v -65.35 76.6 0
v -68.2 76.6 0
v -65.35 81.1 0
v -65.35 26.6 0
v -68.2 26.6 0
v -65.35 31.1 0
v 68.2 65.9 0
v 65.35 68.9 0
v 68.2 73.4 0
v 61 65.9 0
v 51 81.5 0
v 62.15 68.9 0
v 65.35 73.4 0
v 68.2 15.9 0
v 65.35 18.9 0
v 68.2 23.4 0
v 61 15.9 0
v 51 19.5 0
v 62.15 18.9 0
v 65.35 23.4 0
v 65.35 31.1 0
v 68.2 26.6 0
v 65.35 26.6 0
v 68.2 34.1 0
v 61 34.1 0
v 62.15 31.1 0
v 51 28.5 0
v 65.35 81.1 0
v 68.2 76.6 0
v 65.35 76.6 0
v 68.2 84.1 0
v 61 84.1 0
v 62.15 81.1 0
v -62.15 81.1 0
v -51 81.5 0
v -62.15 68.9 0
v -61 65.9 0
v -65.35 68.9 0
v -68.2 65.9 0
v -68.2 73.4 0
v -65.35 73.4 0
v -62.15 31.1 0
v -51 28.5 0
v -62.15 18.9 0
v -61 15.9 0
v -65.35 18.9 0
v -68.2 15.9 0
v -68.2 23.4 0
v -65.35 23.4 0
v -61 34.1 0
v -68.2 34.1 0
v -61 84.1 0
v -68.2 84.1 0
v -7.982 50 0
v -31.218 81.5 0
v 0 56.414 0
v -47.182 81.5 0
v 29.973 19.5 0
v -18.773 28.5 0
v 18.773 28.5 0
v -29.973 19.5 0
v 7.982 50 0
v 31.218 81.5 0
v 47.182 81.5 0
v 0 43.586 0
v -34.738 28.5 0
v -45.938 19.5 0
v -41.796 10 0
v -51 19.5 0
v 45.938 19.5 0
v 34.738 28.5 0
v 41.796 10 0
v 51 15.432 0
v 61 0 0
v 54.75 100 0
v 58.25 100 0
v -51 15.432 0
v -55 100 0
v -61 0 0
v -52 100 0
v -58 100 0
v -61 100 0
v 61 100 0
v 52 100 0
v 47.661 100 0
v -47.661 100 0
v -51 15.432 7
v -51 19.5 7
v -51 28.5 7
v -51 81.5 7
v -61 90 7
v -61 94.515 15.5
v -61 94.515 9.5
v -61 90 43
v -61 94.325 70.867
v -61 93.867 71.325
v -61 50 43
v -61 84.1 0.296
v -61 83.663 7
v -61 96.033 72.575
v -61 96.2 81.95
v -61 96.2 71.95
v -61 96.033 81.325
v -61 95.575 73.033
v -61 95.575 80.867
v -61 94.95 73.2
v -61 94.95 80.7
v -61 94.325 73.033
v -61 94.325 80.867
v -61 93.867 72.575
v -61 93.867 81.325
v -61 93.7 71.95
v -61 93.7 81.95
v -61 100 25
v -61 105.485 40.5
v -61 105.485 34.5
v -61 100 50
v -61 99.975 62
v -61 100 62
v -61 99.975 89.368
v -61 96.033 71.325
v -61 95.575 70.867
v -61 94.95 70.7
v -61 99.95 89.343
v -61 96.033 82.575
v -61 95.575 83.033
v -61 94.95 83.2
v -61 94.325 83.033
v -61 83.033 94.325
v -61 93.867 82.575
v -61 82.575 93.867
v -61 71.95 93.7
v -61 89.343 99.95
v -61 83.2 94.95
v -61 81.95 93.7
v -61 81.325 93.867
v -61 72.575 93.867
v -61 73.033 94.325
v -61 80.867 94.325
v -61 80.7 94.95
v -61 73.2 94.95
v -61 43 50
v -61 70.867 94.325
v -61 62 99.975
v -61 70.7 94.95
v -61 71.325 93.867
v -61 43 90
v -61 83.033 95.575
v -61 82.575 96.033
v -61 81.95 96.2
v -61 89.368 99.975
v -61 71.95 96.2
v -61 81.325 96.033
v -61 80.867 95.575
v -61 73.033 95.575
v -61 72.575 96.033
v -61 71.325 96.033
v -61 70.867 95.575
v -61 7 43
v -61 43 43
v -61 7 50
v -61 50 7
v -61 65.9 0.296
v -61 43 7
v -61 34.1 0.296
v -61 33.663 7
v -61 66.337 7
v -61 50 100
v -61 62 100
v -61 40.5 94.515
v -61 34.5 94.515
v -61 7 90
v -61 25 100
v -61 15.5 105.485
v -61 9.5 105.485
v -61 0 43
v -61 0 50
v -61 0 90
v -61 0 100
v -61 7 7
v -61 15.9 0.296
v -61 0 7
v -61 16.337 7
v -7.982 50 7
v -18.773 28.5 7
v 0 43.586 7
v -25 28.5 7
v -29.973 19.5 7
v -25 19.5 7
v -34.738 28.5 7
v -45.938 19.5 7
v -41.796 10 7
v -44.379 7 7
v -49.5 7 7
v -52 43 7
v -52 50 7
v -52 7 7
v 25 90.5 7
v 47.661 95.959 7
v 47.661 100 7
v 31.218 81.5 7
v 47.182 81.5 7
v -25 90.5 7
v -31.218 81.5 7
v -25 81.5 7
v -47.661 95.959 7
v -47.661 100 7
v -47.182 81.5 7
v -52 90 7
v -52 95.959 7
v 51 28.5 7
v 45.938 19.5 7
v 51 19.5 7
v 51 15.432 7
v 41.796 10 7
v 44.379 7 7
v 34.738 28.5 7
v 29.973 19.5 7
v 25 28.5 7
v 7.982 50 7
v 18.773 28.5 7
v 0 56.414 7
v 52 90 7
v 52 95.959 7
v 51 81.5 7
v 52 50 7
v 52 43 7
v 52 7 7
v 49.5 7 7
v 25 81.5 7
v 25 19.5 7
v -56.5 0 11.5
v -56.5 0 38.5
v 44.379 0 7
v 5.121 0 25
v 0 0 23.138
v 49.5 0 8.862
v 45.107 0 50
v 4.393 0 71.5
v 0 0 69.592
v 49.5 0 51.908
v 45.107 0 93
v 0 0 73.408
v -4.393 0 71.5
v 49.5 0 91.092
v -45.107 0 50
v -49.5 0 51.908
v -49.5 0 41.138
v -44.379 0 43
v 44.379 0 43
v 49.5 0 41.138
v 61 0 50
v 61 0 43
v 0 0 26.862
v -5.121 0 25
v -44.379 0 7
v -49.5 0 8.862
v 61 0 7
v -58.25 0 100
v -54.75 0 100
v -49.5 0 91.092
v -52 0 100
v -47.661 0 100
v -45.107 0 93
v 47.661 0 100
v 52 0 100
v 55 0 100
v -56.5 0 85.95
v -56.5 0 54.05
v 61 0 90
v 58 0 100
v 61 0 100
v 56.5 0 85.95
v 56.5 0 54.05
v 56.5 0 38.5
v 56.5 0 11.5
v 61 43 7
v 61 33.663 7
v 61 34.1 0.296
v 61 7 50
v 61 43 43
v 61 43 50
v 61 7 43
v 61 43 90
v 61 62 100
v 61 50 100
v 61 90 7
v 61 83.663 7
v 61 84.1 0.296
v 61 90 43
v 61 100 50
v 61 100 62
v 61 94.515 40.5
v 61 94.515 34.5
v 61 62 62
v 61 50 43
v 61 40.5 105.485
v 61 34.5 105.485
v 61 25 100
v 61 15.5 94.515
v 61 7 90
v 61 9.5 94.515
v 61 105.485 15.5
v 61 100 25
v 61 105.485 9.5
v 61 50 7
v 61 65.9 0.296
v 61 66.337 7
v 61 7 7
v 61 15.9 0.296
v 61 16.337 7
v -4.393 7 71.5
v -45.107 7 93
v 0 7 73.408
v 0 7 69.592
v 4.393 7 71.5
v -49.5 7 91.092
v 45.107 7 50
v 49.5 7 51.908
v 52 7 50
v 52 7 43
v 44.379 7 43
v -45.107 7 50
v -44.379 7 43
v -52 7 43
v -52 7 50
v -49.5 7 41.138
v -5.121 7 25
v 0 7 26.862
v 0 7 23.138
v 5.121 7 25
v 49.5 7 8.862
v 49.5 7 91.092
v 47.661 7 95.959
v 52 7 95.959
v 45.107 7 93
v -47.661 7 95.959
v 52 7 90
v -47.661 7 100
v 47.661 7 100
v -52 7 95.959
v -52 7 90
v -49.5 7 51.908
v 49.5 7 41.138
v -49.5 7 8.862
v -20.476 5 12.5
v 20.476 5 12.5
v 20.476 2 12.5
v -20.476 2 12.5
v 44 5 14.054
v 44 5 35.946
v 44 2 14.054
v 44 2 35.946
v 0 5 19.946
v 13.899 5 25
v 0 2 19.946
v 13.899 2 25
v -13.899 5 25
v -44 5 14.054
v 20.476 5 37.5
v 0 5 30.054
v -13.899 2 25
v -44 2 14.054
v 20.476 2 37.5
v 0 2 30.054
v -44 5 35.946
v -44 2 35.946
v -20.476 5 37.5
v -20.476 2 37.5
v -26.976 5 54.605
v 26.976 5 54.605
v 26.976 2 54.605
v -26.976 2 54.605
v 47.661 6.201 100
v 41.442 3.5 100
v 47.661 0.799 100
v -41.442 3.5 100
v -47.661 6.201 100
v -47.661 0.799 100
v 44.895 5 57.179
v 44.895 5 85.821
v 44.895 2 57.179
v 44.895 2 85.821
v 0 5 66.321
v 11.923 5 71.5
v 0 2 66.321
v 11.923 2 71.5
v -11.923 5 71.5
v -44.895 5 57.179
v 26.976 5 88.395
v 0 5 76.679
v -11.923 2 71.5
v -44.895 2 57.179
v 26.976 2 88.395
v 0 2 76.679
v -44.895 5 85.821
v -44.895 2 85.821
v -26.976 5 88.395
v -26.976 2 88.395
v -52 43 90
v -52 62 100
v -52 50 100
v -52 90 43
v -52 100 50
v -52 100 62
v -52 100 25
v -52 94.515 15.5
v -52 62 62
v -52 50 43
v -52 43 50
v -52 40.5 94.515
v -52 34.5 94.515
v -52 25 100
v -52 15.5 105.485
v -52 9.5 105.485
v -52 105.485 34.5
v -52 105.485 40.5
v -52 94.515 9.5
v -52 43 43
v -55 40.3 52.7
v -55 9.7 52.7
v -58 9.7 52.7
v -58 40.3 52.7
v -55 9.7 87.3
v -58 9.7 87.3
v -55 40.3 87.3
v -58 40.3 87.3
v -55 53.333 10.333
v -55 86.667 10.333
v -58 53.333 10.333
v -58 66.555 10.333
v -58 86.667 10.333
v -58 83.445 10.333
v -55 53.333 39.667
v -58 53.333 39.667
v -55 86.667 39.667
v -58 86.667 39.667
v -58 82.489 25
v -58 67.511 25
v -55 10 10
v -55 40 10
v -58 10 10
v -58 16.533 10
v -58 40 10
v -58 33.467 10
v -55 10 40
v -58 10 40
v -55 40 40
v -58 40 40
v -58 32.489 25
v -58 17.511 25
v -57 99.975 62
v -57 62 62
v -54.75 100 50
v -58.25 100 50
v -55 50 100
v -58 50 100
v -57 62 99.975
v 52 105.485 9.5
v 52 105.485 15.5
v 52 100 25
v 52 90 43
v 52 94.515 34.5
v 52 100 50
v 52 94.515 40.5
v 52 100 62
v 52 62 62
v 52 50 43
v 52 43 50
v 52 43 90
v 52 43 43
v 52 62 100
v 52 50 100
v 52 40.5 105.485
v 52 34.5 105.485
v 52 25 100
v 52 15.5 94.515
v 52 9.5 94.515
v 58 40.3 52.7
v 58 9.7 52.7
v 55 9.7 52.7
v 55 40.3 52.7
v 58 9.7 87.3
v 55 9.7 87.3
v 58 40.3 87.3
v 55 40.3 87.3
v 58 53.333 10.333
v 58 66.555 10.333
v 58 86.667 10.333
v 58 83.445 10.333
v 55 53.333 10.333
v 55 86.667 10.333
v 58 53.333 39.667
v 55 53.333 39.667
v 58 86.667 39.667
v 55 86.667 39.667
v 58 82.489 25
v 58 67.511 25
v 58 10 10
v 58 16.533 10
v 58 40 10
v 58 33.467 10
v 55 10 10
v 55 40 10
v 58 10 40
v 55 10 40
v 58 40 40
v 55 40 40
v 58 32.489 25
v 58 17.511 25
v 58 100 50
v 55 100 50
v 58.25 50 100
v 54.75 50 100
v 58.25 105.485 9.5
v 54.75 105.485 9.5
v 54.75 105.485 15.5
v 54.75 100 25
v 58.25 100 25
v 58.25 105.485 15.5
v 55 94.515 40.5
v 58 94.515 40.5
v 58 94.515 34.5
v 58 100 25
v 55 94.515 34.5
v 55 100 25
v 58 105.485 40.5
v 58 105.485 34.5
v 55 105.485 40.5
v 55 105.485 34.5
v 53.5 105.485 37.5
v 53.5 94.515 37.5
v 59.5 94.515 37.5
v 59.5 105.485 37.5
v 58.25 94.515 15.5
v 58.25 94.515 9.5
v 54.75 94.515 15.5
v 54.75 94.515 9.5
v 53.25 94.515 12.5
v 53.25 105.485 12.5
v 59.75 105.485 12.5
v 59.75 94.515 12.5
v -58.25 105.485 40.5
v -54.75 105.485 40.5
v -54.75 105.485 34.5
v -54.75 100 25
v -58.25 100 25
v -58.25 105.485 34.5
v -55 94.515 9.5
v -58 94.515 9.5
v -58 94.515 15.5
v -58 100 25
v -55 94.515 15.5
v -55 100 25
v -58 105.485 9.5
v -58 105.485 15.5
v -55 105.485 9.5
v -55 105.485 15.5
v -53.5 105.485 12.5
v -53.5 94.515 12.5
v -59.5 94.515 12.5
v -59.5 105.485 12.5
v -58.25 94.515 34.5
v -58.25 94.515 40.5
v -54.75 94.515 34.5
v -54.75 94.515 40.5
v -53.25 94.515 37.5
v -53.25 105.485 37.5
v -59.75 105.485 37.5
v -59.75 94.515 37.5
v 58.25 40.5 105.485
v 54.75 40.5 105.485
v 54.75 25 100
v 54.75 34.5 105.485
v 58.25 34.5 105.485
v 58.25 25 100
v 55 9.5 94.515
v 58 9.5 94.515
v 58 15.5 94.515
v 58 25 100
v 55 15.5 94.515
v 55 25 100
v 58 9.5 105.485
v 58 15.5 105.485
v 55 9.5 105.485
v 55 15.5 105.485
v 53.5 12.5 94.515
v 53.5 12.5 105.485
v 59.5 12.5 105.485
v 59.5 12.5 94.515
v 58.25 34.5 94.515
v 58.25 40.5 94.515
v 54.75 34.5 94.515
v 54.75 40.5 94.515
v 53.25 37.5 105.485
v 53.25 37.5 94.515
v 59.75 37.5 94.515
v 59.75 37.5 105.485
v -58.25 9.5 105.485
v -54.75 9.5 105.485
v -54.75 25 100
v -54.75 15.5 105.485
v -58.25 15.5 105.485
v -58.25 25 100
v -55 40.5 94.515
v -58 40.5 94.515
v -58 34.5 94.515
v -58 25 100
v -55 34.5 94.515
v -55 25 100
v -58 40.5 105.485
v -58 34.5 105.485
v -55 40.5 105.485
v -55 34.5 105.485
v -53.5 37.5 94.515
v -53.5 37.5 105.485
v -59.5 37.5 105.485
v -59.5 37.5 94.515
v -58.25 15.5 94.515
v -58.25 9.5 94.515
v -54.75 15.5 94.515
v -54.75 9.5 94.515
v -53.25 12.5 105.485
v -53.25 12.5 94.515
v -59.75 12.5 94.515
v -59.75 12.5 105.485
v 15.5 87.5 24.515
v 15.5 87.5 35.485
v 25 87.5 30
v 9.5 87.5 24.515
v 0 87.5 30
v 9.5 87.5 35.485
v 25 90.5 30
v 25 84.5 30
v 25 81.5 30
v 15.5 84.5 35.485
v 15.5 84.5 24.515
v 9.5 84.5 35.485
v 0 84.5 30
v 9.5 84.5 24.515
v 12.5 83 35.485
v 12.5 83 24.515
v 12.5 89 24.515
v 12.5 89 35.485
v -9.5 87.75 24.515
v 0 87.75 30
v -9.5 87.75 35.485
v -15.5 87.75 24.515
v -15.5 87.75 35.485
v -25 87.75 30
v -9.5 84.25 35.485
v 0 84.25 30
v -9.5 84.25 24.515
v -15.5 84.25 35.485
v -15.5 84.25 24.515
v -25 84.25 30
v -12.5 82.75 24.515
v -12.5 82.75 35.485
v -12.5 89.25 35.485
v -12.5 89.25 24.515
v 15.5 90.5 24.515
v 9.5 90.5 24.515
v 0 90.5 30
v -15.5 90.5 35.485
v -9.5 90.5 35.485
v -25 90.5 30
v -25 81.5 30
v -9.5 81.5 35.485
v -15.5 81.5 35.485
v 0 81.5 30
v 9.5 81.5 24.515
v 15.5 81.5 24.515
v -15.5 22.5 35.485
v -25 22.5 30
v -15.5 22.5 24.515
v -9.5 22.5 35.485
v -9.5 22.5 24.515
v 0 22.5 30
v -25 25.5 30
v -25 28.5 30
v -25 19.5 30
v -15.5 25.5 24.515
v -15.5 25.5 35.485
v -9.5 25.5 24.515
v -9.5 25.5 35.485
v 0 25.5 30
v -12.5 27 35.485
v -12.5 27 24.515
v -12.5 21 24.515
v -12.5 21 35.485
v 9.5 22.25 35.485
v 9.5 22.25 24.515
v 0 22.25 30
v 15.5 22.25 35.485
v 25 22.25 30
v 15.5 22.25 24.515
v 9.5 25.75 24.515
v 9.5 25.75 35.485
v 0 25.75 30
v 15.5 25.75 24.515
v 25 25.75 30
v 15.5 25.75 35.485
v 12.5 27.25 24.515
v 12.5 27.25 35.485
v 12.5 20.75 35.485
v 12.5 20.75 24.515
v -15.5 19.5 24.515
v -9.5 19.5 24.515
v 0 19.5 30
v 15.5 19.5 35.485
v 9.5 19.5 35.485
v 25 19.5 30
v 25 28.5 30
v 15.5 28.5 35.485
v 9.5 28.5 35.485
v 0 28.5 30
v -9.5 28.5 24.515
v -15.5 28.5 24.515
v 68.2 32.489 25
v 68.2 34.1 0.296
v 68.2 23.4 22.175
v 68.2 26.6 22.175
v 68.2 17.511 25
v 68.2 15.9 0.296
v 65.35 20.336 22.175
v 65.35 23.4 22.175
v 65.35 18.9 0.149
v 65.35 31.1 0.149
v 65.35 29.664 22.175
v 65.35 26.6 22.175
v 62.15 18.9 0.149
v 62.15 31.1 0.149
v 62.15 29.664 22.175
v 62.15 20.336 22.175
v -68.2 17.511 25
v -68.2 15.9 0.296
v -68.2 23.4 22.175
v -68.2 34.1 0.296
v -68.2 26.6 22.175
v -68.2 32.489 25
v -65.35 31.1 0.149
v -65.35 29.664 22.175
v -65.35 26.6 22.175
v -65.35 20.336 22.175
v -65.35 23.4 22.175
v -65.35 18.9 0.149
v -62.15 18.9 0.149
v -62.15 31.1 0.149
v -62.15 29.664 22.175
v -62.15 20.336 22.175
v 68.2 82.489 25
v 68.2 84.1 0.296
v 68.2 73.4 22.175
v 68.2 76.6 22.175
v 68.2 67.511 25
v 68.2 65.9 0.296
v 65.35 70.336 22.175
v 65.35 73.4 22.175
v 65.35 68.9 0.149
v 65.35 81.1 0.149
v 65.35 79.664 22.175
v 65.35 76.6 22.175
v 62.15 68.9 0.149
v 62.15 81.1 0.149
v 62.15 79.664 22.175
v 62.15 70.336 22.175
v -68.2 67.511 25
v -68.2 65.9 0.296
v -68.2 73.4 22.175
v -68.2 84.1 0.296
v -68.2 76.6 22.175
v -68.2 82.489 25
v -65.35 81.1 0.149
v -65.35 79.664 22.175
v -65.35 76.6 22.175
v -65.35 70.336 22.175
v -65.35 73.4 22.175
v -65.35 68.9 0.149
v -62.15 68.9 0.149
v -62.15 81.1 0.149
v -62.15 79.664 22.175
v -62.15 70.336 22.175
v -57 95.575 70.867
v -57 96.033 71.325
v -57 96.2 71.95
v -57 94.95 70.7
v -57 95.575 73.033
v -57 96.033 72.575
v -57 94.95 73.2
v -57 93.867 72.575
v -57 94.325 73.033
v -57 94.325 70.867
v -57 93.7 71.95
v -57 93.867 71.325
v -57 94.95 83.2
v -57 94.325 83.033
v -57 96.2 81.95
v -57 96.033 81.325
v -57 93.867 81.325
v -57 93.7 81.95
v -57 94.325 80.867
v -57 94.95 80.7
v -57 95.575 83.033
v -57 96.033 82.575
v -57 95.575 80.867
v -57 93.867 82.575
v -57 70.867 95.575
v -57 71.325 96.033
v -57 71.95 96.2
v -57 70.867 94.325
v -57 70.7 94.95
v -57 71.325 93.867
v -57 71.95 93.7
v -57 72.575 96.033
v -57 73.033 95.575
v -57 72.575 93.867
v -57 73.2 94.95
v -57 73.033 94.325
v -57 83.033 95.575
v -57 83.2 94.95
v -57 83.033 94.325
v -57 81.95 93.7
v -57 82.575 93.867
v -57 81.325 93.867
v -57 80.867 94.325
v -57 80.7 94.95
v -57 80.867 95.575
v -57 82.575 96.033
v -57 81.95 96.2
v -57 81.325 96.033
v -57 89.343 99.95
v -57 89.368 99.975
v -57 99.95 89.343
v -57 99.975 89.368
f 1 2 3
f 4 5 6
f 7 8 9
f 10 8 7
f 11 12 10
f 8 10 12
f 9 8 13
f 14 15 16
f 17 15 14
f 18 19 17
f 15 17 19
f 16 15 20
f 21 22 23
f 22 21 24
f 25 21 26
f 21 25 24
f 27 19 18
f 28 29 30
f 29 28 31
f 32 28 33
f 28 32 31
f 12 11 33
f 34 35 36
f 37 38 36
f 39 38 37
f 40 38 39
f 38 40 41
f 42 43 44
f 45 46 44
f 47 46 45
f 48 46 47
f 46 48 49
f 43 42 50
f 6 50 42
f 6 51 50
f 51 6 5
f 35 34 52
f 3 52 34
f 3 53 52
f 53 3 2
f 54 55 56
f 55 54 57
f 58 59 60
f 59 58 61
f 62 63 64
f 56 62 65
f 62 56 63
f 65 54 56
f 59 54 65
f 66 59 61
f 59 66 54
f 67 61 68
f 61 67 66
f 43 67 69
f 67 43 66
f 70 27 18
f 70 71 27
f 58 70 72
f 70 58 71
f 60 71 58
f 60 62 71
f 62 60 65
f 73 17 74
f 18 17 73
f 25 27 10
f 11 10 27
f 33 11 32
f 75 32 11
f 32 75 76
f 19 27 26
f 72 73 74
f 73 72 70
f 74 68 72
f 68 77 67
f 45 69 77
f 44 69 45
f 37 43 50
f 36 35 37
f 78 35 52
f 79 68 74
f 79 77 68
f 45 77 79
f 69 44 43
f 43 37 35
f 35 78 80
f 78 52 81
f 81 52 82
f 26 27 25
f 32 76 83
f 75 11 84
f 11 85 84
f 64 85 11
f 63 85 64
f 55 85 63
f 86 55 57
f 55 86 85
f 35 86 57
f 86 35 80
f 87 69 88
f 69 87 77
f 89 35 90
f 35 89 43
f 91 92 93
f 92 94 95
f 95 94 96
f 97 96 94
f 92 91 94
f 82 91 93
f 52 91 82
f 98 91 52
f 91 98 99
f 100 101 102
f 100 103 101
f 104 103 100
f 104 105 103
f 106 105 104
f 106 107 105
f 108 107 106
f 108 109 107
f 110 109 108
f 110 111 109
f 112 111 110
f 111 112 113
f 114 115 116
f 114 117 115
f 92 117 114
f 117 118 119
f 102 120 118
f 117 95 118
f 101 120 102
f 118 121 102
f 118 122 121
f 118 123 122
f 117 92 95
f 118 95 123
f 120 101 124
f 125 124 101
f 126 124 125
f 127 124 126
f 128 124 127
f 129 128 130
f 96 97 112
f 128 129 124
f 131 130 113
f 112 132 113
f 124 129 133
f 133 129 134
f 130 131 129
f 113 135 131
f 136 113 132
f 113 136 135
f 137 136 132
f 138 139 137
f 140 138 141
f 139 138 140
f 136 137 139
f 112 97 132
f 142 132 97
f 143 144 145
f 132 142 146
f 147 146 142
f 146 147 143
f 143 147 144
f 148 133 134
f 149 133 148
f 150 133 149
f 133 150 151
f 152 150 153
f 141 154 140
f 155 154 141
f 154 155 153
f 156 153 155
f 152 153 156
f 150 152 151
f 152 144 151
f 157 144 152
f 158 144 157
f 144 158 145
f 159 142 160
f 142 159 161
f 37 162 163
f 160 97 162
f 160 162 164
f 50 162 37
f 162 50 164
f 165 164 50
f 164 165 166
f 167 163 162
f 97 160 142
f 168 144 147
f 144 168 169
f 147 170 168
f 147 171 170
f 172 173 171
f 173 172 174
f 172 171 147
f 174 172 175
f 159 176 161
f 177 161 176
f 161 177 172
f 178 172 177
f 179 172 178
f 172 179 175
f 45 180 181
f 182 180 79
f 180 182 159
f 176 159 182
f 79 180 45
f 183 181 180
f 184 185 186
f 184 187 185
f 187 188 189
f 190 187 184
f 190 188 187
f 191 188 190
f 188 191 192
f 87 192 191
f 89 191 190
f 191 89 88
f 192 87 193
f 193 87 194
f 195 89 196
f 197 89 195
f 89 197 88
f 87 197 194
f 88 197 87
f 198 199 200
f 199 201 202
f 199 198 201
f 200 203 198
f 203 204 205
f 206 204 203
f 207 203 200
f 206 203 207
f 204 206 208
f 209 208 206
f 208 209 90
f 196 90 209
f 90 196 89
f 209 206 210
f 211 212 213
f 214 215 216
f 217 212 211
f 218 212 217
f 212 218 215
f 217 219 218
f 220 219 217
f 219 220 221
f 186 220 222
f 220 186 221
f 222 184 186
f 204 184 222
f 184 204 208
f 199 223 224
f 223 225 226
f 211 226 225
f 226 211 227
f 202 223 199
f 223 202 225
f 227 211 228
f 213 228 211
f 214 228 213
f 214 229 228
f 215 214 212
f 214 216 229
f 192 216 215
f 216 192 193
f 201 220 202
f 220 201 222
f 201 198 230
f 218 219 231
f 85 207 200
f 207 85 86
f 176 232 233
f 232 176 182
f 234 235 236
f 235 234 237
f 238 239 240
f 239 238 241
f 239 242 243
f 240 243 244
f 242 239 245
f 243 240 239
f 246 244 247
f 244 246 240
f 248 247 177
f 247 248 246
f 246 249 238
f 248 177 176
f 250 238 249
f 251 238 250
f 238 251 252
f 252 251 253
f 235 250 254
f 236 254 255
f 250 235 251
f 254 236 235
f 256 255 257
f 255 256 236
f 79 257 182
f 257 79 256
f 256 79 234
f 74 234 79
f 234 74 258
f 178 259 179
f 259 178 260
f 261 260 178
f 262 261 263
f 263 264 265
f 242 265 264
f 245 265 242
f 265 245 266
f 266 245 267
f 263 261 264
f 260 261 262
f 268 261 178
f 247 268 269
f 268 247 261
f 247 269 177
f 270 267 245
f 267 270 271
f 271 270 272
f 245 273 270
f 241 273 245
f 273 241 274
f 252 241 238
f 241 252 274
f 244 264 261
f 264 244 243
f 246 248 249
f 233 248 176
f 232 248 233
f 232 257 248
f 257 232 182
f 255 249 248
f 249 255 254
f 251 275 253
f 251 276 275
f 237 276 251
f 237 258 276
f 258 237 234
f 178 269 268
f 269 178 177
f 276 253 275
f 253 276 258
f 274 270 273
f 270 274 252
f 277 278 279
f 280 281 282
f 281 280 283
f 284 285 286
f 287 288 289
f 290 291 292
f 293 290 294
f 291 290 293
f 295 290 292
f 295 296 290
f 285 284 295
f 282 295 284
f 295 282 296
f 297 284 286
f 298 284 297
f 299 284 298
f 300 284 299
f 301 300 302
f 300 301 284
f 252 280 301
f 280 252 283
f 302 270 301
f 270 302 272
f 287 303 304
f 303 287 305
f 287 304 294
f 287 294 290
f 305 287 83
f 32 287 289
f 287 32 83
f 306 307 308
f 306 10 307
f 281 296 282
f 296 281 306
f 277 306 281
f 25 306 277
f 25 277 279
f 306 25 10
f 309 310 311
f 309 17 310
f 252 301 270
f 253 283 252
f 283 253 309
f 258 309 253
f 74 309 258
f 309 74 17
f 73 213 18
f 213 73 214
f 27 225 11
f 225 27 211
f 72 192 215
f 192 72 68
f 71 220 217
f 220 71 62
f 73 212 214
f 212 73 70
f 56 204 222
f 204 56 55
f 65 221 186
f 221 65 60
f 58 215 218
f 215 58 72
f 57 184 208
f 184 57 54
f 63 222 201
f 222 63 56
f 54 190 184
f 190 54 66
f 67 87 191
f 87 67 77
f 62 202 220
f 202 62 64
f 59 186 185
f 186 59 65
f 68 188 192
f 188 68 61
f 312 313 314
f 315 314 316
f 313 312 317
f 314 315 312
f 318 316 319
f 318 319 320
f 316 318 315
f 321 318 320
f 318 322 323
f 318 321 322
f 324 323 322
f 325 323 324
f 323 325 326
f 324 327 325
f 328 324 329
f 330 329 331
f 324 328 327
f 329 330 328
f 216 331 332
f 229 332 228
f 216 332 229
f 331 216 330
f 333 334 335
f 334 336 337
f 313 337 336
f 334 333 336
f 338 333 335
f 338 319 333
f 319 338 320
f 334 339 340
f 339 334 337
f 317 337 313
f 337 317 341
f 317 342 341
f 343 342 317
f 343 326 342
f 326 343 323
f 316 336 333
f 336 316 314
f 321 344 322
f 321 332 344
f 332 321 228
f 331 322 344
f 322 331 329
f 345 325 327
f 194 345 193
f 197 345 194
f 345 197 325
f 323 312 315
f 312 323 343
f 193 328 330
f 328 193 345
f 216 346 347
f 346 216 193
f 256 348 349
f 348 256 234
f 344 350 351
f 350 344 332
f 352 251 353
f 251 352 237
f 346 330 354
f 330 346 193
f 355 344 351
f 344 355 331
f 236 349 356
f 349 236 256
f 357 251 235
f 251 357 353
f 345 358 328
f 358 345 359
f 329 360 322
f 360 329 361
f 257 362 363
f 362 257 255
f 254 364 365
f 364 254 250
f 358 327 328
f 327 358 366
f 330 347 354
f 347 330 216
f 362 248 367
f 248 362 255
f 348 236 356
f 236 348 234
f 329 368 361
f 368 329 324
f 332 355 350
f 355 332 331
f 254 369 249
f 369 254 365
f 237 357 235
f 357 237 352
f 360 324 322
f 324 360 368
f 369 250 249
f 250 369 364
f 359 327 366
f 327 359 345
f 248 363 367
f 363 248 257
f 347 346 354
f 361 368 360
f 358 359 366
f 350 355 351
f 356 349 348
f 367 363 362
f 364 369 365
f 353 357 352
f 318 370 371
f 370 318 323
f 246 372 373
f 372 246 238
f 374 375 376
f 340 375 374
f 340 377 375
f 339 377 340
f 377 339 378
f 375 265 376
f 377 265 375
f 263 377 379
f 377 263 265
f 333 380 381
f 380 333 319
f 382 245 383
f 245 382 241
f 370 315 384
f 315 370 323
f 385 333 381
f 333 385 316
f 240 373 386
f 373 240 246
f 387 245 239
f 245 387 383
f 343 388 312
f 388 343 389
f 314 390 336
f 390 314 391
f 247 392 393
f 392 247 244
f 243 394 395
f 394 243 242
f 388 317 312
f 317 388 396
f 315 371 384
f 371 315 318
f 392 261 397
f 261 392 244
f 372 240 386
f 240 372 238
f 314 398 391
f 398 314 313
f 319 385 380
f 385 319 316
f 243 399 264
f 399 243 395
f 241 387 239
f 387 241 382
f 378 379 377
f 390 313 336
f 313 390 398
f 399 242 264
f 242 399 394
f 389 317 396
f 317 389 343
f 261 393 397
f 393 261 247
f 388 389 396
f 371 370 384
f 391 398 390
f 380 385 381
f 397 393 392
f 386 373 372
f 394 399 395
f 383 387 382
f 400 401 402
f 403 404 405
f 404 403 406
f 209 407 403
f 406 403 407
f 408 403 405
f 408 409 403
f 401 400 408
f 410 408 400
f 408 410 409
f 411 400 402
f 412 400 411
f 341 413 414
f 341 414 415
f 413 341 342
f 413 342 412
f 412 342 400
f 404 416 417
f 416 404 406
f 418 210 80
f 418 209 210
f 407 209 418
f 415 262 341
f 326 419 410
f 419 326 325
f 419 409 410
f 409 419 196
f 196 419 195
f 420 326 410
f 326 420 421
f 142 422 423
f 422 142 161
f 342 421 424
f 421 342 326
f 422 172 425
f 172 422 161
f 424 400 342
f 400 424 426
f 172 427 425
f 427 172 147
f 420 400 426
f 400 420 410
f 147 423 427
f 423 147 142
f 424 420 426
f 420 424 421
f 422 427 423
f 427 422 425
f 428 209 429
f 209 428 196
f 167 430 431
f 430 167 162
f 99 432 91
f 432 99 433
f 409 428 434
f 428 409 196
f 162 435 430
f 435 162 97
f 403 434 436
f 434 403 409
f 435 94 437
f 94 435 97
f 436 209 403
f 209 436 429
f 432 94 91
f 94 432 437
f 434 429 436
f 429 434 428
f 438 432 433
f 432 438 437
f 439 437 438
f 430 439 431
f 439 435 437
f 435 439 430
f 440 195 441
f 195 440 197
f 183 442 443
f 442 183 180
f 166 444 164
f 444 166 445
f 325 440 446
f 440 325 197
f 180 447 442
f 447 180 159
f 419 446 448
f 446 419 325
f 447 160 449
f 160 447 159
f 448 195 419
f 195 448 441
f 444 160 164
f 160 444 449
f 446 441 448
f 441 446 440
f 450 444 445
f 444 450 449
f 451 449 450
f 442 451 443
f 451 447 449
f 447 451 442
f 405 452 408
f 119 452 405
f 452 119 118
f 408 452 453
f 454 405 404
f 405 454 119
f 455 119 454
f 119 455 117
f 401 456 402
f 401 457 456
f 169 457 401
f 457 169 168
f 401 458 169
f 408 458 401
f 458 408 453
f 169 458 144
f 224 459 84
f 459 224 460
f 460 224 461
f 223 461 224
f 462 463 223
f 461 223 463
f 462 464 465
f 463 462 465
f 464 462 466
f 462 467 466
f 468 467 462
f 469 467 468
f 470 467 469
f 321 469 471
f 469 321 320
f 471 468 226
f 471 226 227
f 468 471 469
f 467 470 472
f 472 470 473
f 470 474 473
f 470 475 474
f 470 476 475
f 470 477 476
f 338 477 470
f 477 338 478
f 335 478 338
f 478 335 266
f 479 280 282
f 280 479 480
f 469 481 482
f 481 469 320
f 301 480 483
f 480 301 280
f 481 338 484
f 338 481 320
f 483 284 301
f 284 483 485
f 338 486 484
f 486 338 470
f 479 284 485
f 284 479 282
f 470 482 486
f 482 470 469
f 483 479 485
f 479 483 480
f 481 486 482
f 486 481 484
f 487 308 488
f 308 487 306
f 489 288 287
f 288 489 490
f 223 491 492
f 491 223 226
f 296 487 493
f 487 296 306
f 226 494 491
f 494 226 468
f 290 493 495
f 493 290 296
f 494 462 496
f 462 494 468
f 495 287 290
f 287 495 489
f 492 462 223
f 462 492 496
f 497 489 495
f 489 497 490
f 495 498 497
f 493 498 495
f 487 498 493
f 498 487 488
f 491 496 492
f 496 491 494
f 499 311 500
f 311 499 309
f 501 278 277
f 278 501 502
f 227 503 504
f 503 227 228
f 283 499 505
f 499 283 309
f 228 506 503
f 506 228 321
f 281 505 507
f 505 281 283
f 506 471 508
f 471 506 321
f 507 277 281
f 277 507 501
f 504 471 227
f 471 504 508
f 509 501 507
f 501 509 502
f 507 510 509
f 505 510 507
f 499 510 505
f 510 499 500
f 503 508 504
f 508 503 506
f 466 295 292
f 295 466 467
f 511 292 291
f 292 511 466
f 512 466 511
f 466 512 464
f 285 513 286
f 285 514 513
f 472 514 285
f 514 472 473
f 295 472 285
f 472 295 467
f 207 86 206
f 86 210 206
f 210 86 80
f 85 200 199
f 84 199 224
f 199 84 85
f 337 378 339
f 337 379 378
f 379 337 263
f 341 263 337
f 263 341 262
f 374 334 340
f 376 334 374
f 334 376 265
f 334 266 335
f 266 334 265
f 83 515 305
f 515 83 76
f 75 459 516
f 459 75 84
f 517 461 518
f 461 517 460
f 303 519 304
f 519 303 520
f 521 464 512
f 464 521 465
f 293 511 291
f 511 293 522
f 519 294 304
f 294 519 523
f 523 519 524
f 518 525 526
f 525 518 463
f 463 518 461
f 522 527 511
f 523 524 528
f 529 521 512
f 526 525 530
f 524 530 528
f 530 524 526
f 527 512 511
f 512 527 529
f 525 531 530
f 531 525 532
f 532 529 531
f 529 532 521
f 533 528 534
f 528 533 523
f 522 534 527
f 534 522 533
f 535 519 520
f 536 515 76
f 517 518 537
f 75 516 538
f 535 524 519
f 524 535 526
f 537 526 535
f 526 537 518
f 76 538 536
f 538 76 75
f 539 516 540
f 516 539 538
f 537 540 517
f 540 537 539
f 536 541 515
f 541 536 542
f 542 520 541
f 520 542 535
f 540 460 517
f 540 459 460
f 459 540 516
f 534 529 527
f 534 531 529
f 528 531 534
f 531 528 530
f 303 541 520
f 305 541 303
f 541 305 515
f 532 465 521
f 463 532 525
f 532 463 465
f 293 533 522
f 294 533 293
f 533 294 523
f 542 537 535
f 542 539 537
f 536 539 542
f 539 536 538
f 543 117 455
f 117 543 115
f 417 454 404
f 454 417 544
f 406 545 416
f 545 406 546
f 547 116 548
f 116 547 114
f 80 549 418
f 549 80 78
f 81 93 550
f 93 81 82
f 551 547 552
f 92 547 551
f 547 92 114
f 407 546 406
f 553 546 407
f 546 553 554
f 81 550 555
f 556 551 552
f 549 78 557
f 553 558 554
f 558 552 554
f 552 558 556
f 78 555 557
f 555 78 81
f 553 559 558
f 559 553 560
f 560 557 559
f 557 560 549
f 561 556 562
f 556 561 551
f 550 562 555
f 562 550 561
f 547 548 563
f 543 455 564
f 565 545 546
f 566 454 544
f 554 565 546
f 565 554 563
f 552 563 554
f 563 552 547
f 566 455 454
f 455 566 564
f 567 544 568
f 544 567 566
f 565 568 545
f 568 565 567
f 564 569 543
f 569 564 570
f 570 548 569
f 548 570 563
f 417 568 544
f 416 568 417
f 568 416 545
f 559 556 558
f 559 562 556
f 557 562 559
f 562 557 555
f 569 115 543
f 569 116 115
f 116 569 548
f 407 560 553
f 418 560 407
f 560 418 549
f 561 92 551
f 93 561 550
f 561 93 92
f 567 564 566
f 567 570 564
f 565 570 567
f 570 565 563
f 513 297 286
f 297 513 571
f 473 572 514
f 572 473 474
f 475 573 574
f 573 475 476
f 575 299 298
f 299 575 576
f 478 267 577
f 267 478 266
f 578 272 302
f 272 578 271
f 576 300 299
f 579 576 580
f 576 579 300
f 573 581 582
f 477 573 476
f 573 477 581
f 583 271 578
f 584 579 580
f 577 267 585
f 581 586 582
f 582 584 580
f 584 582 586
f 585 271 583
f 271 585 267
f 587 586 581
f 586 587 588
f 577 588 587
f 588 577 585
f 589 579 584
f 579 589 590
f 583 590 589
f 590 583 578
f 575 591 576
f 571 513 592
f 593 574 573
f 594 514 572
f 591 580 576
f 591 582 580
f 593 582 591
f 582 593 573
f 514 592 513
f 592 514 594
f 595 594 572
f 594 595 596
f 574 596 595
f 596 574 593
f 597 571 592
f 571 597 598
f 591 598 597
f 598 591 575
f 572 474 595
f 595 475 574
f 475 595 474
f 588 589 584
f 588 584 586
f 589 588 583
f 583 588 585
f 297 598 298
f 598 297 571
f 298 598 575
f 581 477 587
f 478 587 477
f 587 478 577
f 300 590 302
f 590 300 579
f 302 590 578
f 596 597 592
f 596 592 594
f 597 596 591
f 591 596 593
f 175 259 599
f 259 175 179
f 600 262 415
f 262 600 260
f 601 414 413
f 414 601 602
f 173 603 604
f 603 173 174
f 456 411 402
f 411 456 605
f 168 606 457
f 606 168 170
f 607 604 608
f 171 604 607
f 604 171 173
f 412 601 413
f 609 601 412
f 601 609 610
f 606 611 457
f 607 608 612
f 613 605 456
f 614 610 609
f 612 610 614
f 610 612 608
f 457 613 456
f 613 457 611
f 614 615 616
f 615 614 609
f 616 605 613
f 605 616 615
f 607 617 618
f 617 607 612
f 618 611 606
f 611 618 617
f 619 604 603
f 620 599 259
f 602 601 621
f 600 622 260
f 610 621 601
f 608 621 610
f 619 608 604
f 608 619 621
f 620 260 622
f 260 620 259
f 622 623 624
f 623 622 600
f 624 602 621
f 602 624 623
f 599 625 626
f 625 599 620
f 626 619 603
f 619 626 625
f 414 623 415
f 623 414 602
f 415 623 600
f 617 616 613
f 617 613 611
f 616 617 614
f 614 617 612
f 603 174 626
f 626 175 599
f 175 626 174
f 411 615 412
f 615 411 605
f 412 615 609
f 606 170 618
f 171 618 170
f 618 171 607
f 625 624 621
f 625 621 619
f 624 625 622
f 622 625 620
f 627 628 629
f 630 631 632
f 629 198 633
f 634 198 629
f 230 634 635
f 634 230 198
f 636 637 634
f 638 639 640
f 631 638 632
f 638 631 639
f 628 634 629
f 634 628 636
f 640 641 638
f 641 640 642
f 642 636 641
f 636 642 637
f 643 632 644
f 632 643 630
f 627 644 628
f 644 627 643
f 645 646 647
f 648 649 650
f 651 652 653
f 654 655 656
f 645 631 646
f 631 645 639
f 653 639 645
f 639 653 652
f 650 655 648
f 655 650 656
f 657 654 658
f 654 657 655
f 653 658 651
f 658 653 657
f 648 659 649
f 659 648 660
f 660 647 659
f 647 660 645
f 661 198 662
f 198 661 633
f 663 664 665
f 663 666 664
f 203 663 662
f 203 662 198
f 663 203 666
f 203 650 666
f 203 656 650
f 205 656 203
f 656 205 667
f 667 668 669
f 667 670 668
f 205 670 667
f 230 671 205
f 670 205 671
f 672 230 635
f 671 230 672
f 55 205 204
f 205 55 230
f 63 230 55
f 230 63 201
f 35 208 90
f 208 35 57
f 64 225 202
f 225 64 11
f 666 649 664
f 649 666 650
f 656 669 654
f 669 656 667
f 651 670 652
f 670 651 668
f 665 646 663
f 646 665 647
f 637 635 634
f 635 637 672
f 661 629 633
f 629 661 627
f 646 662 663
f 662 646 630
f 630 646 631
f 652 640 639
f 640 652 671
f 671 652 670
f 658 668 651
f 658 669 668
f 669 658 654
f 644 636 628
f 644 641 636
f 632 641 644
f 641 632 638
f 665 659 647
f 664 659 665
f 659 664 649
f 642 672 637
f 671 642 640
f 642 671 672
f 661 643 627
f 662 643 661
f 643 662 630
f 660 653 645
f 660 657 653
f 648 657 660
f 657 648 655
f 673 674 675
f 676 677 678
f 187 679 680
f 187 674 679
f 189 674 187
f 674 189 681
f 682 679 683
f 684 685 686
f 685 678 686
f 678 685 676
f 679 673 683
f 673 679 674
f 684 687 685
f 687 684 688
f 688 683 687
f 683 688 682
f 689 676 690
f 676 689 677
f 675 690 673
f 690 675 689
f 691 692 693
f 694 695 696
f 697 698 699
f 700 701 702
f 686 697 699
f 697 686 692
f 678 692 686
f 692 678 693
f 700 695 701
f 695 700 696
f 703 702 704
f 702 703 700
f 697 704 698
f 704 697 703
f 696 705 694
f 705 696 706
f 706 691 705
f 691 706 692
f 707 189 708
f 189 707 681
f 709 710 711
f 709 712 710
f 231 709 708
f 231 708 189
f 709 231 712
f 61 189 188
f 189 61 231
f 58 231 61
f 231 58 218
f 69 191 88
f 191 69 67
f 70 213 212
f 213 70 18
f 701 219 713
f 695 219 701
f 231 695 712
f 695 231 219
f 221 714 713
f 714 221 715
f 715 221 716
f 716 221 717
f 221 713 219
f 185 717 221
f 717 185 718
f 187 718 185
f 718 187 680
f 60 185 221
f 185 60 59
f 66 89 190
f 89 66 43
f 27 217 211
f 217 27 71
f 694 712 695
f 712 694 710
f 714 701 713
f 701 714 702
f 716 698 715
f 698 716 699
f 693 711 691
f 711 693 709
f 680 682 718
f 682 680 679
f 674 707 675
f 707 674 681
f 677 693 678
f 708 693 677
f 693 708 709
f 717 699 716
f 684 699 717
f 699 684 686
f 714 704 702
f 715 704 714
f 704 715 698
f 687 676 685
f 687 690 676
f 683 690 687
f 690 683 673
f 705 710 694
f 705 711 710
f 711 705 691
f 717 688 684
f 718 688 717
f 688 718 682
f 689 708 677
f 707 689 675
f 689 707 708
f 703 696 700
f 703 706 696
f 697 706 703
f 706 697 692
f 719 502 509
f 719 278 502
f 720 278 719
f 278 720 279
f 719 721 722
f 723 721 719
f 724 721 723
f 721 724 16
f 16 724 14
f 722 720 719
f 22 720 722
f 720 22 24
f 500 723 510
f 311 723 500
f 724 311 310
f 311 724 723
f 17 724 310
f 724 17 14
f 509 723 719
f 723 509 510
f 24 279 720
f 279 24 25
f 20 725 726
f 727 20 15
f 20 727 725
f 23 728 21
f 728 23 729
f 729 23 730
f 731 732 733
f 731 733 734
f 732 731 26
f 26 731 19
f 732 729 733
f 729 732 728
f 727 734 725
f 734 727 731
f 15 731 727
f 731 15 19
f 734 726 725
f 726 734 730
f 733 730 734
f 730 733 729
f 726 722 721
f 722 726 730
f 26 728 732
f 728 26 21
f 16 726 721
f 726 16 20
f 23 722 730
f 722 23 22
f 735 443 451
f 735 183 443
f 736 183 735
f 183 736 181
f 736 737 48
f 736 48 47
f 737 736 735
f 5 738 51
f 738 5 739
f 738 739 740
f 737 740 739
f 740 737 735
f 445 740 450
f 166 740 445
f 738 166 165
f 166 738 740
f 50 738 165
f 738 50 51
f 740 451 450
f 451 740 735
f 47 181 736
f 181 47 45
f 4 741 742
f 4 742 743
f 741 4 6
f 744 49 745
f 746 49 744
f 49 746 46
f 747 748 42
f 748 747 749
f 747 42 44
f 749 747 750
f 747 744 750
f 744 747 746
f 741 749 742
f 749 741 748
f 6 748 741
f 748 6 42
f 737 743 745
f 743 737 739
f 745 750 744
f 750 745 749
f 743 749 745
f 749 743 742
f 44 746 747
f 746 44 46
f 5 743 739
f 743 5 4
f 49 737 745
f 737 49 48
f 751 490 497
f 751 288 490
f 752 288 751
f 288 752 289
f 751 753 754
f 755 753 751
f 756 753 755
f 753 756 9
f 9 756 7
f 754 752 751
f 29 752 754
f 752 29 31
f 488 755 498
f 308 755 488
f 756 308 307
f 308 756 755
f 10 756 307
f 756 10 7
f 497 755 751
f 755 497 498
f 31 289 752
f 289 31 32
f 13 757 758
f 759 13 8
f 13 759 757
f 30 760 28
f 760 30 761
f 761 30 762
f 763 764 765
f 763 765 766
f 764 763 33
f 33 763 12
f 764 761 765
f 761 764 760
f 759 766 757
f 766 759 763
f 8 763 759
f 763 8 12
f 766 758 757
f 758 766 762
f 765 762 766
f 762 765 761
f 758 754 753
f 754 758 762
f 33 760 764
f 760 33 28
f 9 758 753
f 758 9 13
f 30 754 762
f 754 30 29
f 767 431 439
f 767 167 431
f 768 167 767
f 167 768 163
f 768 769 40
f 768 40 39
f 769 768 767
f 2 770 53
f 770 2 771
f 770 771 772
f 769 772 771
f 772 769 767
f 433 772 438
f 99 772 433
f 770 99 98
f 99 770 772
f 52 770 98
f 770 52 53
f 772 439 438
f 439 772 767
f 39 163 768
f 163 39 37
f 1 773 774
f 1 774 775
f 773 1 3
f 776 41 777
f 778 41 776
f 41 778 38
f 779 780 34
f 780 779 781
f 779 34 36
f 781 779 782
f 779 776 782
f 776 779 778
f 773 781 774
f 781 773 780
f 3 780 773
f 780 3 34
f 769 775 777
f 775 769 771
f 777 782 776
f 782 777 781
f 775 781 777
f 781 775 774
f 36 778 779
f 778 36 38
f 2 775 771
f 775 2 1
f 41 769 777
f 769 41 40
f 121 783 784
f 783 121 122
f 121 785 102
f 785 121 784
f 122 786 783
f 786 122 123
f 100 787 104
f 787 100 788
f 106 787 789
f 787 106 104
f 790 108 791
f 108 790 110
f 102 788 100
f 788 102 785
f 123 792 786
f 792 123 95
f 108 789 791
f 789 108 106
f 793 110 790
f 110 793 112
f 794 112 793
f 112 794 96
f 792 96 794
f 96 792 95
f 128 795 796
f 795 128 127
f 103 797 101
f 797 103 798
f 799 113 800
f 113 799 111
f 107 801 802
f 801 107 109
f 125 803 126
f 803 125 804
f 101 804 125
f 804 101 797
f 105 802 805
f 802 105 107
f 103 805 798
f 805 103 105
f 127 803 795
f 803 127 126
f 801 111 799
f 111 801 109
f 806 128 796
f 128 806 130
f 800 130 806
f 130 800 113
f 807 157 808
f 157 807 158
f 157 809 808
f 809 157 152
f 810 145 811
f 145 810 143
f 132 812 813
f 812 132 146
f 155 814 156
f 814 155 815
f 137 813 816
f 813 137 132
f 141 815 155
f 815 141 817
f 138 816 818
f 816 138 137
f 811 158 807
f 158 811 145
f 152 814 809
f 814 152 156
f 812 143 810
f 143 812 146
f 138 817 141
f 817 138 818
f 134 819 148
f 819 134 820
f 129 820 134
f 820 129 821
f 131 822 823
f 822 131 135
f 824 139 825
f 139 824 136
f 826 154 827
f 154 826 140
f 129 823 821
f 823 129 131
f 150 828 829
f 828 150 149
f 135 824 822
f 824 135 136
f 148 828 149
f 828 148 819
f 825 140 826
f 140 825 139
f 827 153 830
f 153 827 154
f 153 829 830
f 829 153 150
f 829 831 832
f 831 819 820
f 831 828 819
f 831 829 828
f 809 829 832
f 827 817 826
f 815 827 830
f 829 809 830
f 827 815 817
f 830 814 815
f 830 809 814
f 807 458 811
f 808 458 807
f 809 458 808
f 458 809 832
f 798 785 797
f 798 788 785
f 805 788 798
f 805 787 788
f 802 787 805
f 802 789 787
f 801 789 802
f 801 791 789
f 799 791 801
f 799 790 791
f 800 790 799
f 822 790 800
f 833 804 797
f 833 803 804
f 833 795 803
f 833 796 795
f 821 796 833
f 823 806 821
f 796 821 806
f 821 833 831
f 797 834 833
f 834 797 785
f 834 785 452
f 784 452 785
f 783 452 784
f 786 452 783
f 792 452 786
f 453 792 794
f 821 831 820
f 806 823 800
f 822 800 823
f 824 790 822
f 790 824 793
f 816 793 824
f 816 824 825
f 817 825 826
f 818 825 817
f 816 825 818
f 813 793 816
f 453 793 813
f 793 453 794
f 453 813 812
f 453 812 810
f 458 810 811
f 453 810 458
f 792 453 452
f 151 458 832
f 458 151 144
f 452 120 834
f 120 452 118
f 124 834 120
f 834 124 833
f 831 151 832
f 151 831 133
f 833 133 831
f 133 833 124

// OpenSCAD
// file: joiners.scad
include <config.scad>
use <GDMUtils.scad>

module joiner(h=40, w=9, l=10, a=30, screwsize=undef, guides=true)
{
	dmnd_height = h/2;
	dmnd_width = dmnd_height*tan(a);
	guide_size = w/3;

	render(convexity=4) union() {
		difference() {
			union() {
				// Make base.
				difference() {
					union() {
						translate([0,-l/2,0]) cube(size=[w, l, h], center=true);
						translate([0,0,-h/4])
							scale([w, dmnd_width/2, dmnd_height/2])
								xrot(45) cube(size=[1,sqrt(2),sqrt(2)], center=true);
					}
					translate([0,0,h/4])
						scale([w*1.1, dmnd_width/2, dmnd_height/2])
							xrot(45) cube(size=[1,sqrt(2),sqrt(2)], center=true);
				}

				// Make tab
				translate([0,0,dmnd_height/2]) {
					translate([0, -dmnd_width/4, 0])
						cube(size=[w/3, dmnd_width/2, dmnd_height], center=true);
					scale([w/3, dmnd_width/2, dmnd_height/2]) xrot(45)
						cube(size=[1,sqrt(2),sqrt(2)], center=true);
				}

				// Guide ridges.
				if (guides == true) {
					translate([0,0,dmnd_height/2]) {
						grid_of(xa=[-w/6,w/6]) {
							scale([1,1,2]) yrot(45)
								cube(size=[guide_size/sqrt(2), dmnd_width, guide_size/sqrt(2)], center=true);
						}
					}
				}
			}

			// Make slot
			translate([0, 0, -dmnd_height/2]) {
				translate([0, dmnd_width/4, 0])
					cube(size=[w/3+joiner_slop, dmnd_width/2, dmnd_height], center=true);
				scale([w/3+joiner_slop, dmnd_width/2, dmnd_height/2]) xrot(45)
					cube(size=[1,sqrt(2),sqrt(2)], center=true);
			}

			// Blunt point of tab.
			translate([0,(2+dmnd_width/2-guide_size*tan(a)),0])
				cube(size=[w*1.1,4,h], center=true);

			// Make screwholes, if needed.
			if (screwsize != undef) {
				xrot_copies([0, 180])
					translate([0, 0, dmnd_height/2])
						yrot(90) cylinder(r=screwsize*1.1/2, h=w+1, center=true, $fn=12);
			}

			// Guide slots.
			if (guides == true) {
				translate([0,0,-dmnd_height/2]) {
					grid_of(xa=[-(w/6+joiner_slop/2),(w/6+joiner_slop/2)]) {
						scale([1,1,2]) yrot(45)
							cube(size=[guide_size/sqrt(2), dmnd_width*1.1, guide_size/sqrt(2)], center=true);
					}
				}
			}
		}

		// Blunt point of slot.
		translate([0,-(2+dmnd_width/2-guide_size*tan(a)),0])
			cube(size=[w,4,h], center=true);
	}
}
//!joiner(screwsize=3);



module lock_tab(h=30, wall=3, slop=0.0)
{
	s1 = 2*wall-slop/2;
	s2 = wall-slop/2;
	ang = atan(((s1-s2)/2)/(h-2));
	translate([0, -(1.5*wall), 0]) union () {
		intersection() {
			yrot( ang) translate([0,0,(h+5)/2]) cube(size=[s1*2, wall-slop, h+10], center=true);
			yrot(-ang) translate([0,0,(h+5)/2]) cube(size=[s1*2, wall-slop, h+10], center=true);
			translate([0,0,(h-wall-slop)/2]) cube(size=[s1*2, wall-slop, h-wall-slop+0.05], center=true);
		}
	}
	translate([0, -(wall+slop/2)/2-0.05, (h-wall-slop)/2]) cube(size=[wall-slop, wall+slop/2+0.1, h-wall-slop+0.05], center=true);
}
//lock_tab(h=30, wall=2, slop=-0.9);



module lock_slot(h=30, wall=3, backing=0, slop=0.2)
{
	s1 = 2*wall+slop/2;
	s2 = wall+slop/2;
	w = 2*s1+2*wall;
	d = wall*3+slop;
	ang = atan(((s1-s2)/2)/(h-2));
	translate([0, (d+backing)/2, 0]) difference() {
		intersection() {
			yrot( ang) translate([0, 0, (h+5)/2]) cube(size=[w, d+backing, h+10], center=true);
			yrot(-ang) translate([0, 0, (h+5)/2]) cube(size=[w, d+backing, h+10], center=true);
			translate([0, 0, h/2]) cube(size=[w, d+backing, h], center=true);
		}
		translate([0, (d+backing)/2+0.05, -0.05]) lock_tab(h=h, wall=wall, slop=-slop);
	}
}
//!lock_slot(h=30, wall=2, slop=0.1);



module cap(r=roller_axle/2-3, h=10, wall=3, cap=2, lip=2)
{
	difference() {
		union() {
			translate([0,0,-cap/2])
				cylinder(r=r+lip+wall, h=cap, center=true, $fn=32);
			translate([0,0,h*3/8])
				cylinder(r1=r-0.5, r2=r, h=h*3/4, center=true, $fn=32);
			translate([0,0,h*7/8])
				cylinder(r1=r, r2=r-wall/2, h=h*1/4, center=true, $fn=32);
		}
		translate([0,0,h/2+1])
			cylinder(r=r-wall, h=h+1, center=true, $fn=12);
		zrot_copies([0,90]) translate([0,0,h*5/8])
			cube(size=[1,r*2,h],center=true);
	}
}
//cap();



// vim: noexpandtab tabstop=4 shiftwidth=4 softtabstop=4 nowrap
// file: config.scad
platform_length = 100;
platform_width  = 150;
platform_height =  40;
platform_thick  =   7;
rack_tooth_size =   5;  // mm per tooth.

rail_length  = 150;
rail_height  =  50;
rail_thick   =   7;

motor_rail_length = 100;

roller_thick =  12;
roller_diam  =  30;
roller_axle  =  15;
roller_angle =  30;
roller_base  =  12;

joiner_angle =  30;
joiner_width =   9;
joiner_slop  =   0.5;



rail_spacing = platform_width - joiner_width*4 - 10;
roller_spacing = rail_spacing-roller_diam+0.5;
rail_width = rail_spacing + joiner_width*2;



// vim: noexpandtab tabstop=4 shiftwidth=4 softtabstop=4 nowrap
// main file
include <config.scad>
use <GDMUtils.scad>
use <joiners.scad>


module rails_90deg_joint()
{
	joiner_length=10;
	base_height = rail_height+roller_thick;
	endstop_delta = platform_length - base_height;

	difference() {
		union() {
			difference() {
				union() {
					// Bottom.
					translate([0,platform_length/2,rail_thick/2]) yrot(90)
						sparse_strut(h=rail_width, l=platform_length, thick=rail_thick, maxang=45, strut=10, max_bridge=500);

					// Lower Back.
					translate([0,rail_thick/2,rail_height/2]) zrot(90) {
						thinning_wall(h=rail_height, l=rail_width-joiner_width, thick=rail_thick, strut=rail_thick);
					}

					// Upper Back.
					translate([0, rail_thick/2, rail_height+(platform_length-rail_height-rail_thick)/2]) zrot(90) {
						thinning_wall(h=platform_length-rail_height+rail_thick, l=rail_width-joiner_width, thick=rail_thick, strut=rail_thick);
					}

					// Side Walls
					grid_of(xa=[-(rail_spacing/2+joiner_width/2), (rail_spacing/2+joiner_width/2)]) {
						// Upper Walls.
						grid_of(
							ya=[rail_height/2],
							za=[(platform_length-rail_height-joiner_length)/2+rail_height]
						) {
							thinning_wall(h=platform_length-joiner_length-rail_height+2*rail_thick, l=rail_height, thick=joiner_width, strut=rail_thick, bracing=false);
						}

						// Lower Walls.
						grid_of(
							ya=[(platform_length-rail_height-joiner_length)/2+rail_height],
							za=[rail_height/2]
						) {
							thinning_wall(l=platform_length-joiner_length-rail_height+2*rail_thick, h=rail_height, thick=joiner_width, strut=rail_thick, bracing=false);
						}

						// Corner Walls.
						grid_of(
							ya=[rail_height/2],
							za=[rail_height/2]
						) {
							thinning_wall(l=rail_height, h=rail_height, thick=joiner_width, strut=rail_thick, bracing=false);
						}

						// Rail tops.
						translate([0, rail_height, rail_height]) {
							translate([0, (platform_length-rail_height)/2, roller_thick/2])
								cube(size=[joiner_width, platform_length-rail_height, roller_thick], center=true);
							translate([0, roller_thick/2, (platform_length-rail_height)/2])
								cube(size=[joiner_width, roller_thick, platform_length-rail_height], center=true);
						}
					}
				}

				// Clear space out near front clips.
				grid_of(
					xa=[-(rail_spacing+joiner_width)/2, (rail_spacing+joiner_width)/2],
					ya=[platform_length],
					za=[(rail_height)/4, (rail_height)*3/4]
				) {
					scale([1, tan(joiner_angle), 1]) xrot(45)
						cube(size=rail_height/2/sqrt(2), center=true);
				}

				// Clear space out near top clips.
				grid_of(
					xa=[-(rail_spacing+joiner_width)/2, (rail_spacing+joiner_width)/2],
					ya=[rail_height/4, rail_height*3/4],
					za=[platform_length]
				) {
					scale([1, 1, tan(joiner_angle)]) xrot(45)
						cube(size=rail_height/2/sqrt(2), center=true);
				}
			}

			// Front Joiner clips.
			translate([0, 0, rail_height/2]) {
				yrot_copies([0, 180]) {
					translate([rail_spacing/2+joiner_width/2, platform_length, 0]) {
						joiner(h=rail_height, w=joiner_width, l=joiner_length, a=joiner_angle);
					}
				}
			}

			// Top Joiner clips.
			translate([0, (rail_height)/2, platform_length]) {
				zrot_copies([0,180]) {
					translate([rail_spacing/2+joiner_width/2, 0, 0]) {
						xrot(90) joiner(h=rail_height, w=joiner_width, l=joiner_length, a=joiner_angle);
					}
				}
			}

			// Motor clip mounts.
			translate([0, rail_height+roller_thick/2-1, 0]) {
				zrot_copies([90, 270]) {
					translate([(43+joiner_width+10)/2, 0, 30]) {
						xrot(90) {
							joiner(h=rail_height, w=joiner_width, l=30, a=joiner_angle);
							translate([0, -30+rail_thick/2, 0])
								cube(size=[joiner_width, rail_thick, rail_width-joiner_width], center=true);
						}
					}
				}
			}

			// Side mount slots.
			translate([0, platform_width/3, 0]) {
				grid_of(ya=[-platform_width/3/2, platform_width/3/2]) {
					zrot_copies([0,180]) {
						translate([rail_width/2-joiner_width/2, 0, 0]) {
							zrot(-90) lock_slot(h=25, wall=3, backing=joiner_width/2-2);
						}
					}
				}
			}

			// Y-axis endstop switch mount
			translate([-(rail_width-4)/2, endstop_delta/2+base_height-0.05, endstop_delta/2+base_height-0.05]) {
				difference() {
					cube(size=[4, endstop_delta+0.05, endstop_delta+0.05], center=true);
					translate([0, endstop_delta/2, endstop_delta/2]) xrot(45)
						cube(size=15, center=true);
					translate([0, endstop_delta/2-5, -endstop_delta/2+15]) {
						grid_of(za=[-5, 5]) {
							yrot(90) {
								cylinder(h=10, r=2.5/2, center=true, $fn=12);
							}
						}
					}
					translate([0, -(endstop_delta/2-15), (endstop_delta/2-5)]) {
						grid_of(ya=[-5, 5]) {
							yrot(90) {
								cylinder(h=10, r=2.5/2, center=true, $fn=12);
							}
						}
					}
				}
			}
		}
	}
}
rails_90deg_joint();



module rails_90deg_joint_point() { // make me
	rails_90deg_joint();
}



rails_90deg_joint_point();



// vim: noexpandtab tabstop=4 shiftwidth=4 softtabstop=4 nowrap
